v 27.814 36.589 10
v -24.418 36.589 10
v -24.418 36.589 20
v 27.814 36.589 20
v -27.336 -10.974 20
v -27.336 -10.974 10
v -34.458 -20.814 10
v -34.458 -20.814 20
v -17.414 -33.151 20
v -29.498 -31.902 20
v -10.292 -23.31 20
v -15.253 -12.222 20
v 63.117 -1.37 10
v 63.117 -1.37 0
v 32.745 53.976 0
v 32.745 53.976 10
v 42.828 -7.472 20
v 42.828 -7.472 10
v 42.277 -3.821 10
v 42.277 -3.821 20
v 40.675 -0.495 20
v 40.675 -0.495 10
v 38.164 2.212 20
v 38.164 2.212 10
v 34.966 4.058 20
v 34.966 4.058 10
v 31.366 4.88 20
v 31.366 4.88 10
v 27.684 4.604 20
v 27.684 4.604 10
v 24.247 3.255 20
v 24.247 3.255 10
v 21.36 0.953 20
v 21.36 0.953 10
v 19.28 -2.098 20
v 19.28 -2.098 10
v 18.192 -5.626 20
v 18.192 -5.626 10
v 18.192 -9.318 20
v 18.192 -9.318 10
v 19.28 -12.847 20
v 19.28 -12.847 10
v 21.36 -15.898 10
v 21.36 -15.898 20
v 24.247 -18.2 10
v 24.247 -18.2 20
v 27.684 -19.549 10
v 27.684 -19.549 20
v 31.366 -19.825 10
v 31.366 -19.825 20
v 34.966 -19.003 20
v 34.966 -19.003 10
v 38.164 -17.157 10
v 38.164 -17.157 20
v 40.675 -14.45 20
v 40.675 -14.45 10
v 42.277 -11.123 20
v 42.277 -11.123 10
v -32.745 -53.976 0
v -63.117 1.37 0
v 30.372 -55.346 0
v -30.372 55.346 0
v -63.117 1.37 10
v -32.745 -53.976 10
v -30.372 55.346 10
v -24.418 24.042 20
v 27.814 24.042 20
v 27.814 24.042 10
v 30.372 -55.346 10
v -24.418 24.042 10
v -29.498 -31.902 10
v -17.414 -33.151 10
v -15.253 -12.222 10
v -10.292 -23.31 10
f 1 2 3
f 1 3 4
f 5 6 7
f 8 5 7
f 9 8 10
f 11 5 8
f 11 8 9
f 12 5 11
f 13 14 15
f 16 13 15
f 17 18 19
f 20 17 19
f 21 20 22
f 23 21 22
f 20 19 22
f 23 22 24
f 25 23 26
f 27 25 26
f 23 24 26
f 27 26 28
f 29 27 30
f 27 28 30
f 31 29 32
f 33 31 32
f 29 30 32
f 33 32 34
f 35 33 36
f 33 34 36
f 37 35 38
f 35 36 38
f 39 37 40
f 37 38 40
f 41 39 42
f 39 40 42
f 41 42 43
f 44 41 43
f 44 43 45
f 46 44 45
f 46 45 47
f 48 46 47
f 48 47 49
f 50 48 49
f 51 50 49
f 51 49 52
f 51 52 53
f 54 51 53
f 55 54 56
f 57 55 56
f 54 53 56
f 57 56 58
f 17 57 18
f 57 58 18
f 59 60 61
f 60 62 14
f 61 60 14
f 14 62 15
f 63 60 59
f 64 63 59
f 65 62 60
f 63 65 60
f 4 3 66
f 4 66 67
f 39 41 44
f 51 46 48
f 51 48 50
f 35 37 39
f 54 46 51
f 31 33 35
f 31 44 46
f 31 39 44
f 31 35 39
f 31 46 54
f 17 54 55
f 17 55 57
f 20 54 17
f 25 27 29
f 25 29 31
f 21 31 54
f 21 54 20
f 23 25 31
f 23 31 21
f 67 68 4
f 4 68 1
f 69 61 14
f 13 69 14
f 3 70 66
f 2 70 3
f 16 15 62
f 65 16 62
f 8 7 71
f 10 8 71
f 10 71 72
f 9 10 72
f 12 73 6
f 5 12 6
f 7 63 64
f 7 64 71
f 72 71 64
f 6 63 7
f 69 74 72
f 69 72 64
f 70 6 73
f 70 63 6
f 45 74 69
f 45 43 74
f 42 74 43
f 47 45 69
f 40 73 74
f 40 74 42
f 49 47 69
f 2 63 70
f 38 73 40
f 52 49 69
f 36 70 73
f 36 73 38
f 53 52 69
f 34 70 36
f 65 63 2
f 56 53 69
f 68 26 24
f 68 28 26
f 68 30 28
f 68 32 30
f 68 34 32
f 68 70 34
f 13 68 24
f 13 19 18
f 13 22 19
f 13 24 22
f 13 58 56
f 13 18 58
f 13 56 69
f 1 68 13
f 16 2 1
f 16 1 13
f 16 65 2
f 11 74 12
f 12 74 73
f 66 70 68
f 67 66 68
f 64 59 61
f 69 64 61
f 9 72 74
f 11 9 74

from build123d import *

# Parameters (mm, degrees)
PAD_DEPTH    = 10
SKETCH001_R  = 12.386876
SKETCH001_W  = 52.232122
SKETCH001_H  = 12.547379
PAD001_DEPTH = 10


with BuildPart() as part:
    # Sketch → Pad (new body)
    with BuildSketch(Plane.XY):
        Polygon((30.372211, -55.345623), (63.116821, -1.369705), (32.74461, 53.975918), (-30.372211, 55.345623), (-63.116821, 1.369705), (-32.74461, -53.975918), align=None)
    extrude(amount=PAD_DEPTH)

    # Sketch001 (on Face8 of Pad) → Pad001 (join)
    with BuildSketch(Plane.XY.offset(10)):
        with Locations((30.440666, -7.472315)):
            Circle(SKETCH001_R)
        with Locations((1.698405, 30.315723)):
            Rectangle(SKETCH001_W, SKETCH001_H)
        Polygon((-17.414461, -33.150673), (-10.291936, -23.310478), (-15.252532, -12.222093), (-27.335653, -10.973903), (-34.458178, -20.814098), (-29.497582, -31.902483), align=None)
    extrude(amount=PAD001_DEPTH)


solid = part.part
